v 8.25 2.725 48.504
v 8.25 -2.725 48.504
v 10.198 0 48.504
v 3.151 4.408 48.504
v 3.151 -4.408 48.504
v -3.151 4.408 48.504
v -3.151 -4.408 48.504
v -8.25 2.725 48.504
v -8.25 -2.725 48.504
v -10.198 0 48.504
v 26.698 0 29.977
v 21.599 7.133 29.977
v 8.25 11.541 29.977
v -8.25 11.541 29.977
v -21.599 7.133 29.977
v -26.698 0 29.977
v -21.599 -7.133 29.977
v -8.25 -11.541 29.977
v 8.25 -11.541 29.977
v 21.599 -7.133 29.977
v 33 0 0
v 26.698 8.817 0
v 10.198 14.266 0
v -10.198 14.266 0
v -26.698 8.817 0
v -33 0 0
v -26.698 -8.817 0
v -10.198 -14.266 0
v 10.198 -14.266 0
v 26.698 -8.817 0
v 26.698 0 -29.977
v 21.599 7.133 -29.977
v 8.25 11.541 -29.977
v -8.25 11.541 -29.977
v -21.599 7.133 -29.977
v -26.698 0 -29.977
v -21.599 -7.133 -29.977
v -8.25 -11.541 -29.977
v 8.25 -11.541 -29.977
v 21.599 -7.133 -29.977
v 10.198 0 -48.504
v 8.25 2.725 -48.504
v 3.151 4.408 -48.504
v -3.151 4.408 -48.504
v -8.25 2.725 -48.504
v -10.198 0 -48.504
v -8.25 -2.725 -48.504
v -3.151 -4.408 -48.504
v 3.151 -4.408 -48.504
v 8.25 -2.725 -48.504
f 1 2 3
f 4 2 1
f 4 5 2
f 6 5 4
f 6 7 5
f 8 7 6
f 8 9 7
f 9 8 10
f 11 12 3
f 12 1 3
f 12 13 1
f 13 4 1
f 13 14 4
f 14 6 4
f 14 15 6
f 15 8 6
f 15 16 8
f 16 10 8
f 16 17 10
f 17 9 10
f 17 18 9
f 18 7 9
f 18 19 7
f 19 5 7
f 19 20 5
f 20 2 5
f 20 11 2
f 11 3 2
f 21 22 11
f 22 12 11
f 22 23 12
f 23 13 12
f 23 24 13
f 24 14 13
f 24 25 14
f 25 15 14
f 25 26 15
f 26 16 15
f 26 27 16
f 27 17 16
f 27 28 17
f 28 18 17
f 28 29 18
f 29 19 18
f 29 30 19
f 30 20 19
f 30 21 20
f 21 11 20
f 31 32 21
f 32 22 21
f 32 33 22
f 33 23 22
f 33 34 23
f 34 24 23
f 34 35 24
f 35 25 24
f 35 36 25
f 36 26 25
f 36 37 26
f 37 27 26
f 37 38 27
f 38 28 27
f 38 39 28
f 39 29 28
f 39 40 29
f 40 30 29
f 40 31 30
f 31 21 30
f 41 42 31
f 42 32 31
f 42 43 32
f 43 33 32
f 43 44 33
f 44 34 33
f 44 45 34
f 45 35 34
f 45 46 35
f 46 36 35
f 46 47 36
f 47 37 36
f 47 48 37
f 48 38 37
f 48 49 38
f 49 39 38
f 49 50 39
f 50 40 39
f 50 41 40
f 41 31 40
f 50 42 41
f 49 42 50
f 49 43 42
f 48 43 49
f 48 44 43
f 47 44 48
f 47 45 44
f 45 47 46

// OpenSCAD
// Generated by SolidPython 1.0.1 on 2020-07-29 00:46:49


scale(v = [11, 5, 17]) {
	sphere(r = 3);
}
/***********************************************
*********      SolidPython code:      **********
************************************************
 
# import packages: SolidPython
from solid import *
from solid.utils import *
from itertools import chain, combinations, permutations


class Resize:

    def __init__(self, scad_file):
        self.scad_file = scad_file
        #self.scad_file = import_scad(scad_file)
        # cone/cylinder param:
        self.r1 = 0
        self.r2 = 0
        self.h = 0
        # rectangular prism param:
        self.w = 0
        self.l = 0
        # ellipse param:
        self.r = 0

    # import OpenScad code (file name corresponds to shape)


    # classify shape + parameters
    def assign(self, param1, param2, param3):
        if self.scad_file == 'cone.scad':
            self.r1 = param1
            self.r2 = param2
            self.h = param3
        elif self.scad_file == 'cylinder.scad':
            self.r1 = param1
            self.r2 = param2
            self.h = param3
        elif self.scad_file == 'rectangularPrism.scad':
            self.h = param1
            self.l = param2
            self.w = param3
        else:
            self.r = param1
            self.h = param2

    # resize parameters
    def iterate(self):
        x = range(3, 20, 2)
        i = 1
        if self.scad_file == 'cone.scad':
            tempList = list(permutations(x, 2))
            for temp in tempList:
                param1 = temp[0]
                param2 = temp[1]
                filepath = 'produced_scad_files/' + 'cone' + str(param1) + '_' + str(param2) + '_' + '.scad'
                scad_render_to_file(cylinder(h=param1, r1=param2, r2=0), filepath)

        elif self.scad_file == 'cylinder.scad':
            tempList = list(permutations(x, 3))
            for temp in tempList:
                param1 = temp[0]
                param2 = temp[1]
                filepath = 'produced_scad_files/' + 'cylinder' + str(param1) + '_' + str(param2) + '_' + '.scad'
                scad_render_to_file(cylinder(h=param1, r1=param2, r2=param2), filepath)

        elif self.scad_file == 'rectangularPrism.scad':
            tempList = list(permutations(x, 3))
            for temp in tempList:
                param1 = temp[0]
                param2 = temp[1]
                param3 = temp[2]
                filepath = 'produced_scad_files/' + 'rectangularPrism' + str(param1) + '_' + str(param2) + '_' + str(
                    param3) + '.scad'
                scad_render_to_file(cube(size=(param1, param2, param3)), filepath)

        elif self.scad_file == 'ellipse.scad':
            tempList = list(permutations(x, 4))
            for temp in tempList:
                param1 = temp[0]
                param2 = temp[1]
                param3 = temp[2]
                param4 = temp[3]
                filepath = 'produced_scad_files/' + 'ellipse' + str(param1) + '_' + str(param2) + '_' + str(param3) + '_' + str(param4) + '.scad'
                scad_render_to_file(scale([param1, param2, param3])(sphere(r=param4)), filepath)

    def render_to_scadfile(self):
        scad_render_to_file(scad, 'example.scad') 
 
************************************************/
